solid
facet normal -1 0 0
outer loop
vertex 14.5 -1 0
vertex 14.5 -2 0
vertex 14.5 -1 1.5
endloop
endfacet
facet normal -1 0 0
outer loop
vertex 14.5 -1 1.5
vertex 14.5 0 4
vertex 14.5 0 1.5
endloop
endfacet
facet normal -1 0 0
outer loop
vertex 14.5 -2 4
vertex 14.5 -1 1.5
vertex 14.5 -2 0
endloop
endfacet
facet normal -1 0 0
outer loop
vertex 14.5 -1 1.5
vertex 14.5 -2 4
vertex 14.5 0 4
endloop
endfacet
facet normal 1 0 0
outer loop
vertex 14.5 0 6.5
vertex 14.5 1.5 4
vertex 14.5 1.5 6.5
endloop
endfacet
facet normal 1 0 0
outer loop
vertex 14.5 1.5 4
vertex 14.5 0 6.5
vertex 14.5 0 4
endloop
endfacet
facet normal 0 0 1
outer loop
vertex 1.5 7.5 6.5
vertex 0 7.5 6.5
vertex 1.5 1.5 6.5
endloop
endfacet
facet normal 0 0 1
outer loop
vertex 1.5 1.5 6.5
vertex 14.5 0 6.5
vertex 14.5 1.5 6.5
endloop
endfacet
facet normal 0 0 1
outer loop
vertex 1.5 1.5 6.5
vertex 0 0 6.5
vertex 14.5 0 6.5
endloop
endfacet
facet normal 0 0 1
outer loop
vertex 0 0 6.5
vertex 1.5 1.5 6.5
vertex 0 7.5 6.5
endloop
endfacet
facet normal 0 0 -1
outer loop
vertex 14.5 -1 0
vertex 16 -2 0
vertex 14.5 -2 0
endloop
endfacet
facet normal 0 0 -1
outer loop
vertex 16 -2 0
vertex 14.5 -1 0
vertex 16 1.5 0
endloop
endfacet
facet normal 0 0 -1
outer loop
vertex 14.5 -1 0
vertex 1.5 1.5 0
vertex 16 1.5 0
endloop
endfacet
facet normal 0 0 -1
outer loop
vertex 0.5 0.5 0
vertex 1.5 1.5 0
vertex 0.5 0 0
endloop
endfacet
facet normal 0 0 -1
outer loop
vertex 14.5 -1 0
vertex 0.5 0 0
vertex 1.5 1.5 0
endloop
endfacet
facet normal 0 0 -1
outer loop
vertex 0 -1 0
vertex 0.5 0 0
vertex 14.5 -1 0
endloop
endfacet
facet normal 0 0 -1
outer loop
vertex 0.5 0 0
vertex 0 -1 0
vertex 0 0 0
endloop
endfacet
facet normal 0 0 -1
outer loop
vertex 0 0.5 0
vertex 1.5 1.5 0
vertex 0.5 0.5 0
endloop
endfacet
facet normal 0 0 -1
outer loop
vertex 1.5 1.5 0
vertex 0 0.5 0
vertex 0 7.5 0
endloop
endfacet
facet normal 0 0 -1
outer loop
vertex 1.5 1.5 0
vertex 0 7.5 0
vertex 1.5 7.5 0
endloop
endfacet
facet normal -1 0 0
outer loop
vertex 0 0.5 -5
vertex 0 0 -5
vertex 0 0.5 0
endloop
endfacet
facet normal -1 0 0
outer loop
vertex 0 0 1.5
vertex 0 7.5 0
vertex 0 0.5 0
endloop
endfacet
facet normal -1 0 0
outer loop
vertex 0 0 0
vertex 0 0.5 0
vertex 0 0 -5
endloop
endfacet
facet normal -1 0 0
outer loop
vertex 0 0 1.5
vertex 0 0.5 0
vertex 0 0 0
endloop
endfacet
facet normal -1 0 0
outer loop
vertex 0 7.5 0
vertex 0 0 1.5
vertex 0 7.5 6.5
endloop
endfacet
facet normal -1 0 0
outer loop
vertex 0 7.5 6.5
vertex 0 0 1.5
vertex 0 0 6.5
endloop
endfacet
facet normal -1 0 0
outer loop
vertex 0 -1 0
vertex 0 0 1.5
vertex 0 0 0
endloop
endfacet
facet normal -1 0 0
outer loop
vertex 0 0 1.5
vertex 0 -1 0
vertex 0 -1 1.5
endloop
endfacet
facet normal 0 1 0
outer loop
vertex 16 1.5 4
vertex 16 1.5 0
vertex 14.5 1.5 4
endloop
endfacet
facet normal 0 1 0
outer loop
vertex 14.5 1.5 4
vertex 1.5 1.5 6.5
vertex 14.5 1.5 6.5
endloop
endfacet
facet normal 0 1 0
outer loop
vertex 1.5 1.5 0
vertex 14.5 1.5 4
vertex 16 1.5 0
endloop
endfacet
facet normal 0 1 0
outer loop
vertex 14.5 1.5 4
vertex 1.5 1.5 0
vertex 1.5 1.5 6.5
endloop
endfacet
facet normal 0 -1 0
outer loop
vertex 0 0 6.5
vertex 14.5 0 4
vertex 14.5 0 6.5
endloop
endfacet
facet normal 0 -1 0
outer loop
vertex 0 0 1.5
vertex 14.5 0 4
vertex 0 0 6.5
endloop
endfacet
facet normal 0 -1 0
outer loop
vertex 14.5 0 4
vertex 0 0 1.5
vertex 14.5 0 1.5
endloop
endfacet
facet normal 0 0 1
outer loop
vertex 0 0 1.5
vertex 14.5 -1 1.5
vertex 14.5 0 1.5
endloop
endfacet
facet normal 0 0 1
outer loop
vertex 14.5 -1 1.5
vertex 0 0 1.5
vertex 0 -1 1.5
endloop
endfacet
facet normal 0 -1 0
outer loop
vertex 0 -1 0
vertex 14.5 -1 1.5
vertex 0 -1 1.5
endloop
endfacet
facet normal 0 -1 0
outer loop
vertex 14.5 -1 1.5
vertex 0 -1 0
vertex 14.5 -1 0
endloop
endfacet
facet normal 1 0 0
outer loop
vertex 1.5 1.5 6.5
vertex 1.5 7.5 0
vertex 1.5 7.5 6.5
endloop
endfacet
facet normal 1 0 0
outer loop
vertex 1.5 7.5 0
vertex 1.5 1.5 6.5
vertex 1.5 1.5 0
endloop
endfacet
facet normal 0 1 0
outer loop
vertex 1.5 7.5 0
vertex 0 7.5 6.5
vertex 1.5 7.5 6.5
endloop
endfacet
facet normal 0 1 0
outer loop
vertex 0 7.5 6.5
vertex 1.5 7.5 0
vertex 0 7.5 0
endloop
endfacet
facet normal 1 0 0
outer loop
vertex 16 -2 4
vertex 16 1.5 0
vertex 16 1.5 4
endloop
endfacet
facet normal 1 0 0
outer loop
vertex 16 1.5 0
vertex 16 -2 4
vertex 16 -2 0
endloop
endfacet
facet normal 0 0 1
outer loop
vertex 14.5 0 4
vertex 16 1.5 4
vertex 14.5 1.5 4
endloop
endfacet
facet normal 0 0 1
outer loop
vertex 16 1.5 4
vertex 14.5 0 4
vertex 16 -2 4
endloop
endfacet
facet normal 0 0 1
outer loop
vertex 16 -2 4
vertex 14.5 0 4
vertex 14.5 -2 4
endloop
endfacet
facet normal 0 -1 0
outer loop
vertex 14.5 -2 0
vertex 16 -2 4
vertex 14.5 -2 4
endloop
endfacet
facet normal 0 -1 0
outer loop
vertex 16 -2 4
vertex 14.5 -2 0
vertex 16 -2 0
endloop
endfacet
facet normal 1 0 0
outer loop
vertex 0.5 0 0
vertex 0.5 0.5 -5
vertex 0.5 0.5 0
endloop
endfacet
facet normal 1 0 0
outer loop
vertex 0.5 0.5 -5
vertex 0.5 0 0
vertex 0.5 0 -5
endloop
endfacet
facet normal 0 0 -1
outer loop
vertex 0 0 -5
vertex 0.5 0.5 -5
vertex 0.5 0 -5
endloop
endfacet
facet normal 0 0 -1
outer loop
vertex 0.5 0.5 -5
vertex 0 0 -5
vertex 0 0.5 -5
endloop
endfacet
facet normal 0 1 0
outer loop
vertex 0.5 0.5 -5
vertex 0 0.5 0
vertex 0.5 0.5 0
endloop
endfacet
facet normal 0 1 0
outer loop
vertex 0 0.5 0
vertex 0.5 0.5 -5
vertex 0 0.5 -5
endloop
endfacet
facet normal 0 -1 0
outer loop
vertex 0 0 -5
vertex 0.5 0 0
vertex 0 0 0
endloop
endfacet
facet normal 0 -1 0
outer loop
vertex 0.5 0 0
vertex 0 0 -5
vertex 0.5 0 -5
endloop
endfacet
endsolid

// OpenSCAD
W1 = 5;
W2 = 1.5;
W3 = 4;
H = 6;
L = 13;
thick = 1.5;
flang = 1;

stand = 5;

cube([L + thick, thick, W1 + W2]);
color("green") translate([0, -flang, 0]) cube([L + thick, flang, W2]);

color("red") cube([thick, H + thick, W1 + W2]);

color("blue") translate([L + thick, -flang * 2, 0]) cube([thick, thick + flang * 2, W3]);

translate([0, 0, -stand]) cube([0.5, 0.5, stand]);
